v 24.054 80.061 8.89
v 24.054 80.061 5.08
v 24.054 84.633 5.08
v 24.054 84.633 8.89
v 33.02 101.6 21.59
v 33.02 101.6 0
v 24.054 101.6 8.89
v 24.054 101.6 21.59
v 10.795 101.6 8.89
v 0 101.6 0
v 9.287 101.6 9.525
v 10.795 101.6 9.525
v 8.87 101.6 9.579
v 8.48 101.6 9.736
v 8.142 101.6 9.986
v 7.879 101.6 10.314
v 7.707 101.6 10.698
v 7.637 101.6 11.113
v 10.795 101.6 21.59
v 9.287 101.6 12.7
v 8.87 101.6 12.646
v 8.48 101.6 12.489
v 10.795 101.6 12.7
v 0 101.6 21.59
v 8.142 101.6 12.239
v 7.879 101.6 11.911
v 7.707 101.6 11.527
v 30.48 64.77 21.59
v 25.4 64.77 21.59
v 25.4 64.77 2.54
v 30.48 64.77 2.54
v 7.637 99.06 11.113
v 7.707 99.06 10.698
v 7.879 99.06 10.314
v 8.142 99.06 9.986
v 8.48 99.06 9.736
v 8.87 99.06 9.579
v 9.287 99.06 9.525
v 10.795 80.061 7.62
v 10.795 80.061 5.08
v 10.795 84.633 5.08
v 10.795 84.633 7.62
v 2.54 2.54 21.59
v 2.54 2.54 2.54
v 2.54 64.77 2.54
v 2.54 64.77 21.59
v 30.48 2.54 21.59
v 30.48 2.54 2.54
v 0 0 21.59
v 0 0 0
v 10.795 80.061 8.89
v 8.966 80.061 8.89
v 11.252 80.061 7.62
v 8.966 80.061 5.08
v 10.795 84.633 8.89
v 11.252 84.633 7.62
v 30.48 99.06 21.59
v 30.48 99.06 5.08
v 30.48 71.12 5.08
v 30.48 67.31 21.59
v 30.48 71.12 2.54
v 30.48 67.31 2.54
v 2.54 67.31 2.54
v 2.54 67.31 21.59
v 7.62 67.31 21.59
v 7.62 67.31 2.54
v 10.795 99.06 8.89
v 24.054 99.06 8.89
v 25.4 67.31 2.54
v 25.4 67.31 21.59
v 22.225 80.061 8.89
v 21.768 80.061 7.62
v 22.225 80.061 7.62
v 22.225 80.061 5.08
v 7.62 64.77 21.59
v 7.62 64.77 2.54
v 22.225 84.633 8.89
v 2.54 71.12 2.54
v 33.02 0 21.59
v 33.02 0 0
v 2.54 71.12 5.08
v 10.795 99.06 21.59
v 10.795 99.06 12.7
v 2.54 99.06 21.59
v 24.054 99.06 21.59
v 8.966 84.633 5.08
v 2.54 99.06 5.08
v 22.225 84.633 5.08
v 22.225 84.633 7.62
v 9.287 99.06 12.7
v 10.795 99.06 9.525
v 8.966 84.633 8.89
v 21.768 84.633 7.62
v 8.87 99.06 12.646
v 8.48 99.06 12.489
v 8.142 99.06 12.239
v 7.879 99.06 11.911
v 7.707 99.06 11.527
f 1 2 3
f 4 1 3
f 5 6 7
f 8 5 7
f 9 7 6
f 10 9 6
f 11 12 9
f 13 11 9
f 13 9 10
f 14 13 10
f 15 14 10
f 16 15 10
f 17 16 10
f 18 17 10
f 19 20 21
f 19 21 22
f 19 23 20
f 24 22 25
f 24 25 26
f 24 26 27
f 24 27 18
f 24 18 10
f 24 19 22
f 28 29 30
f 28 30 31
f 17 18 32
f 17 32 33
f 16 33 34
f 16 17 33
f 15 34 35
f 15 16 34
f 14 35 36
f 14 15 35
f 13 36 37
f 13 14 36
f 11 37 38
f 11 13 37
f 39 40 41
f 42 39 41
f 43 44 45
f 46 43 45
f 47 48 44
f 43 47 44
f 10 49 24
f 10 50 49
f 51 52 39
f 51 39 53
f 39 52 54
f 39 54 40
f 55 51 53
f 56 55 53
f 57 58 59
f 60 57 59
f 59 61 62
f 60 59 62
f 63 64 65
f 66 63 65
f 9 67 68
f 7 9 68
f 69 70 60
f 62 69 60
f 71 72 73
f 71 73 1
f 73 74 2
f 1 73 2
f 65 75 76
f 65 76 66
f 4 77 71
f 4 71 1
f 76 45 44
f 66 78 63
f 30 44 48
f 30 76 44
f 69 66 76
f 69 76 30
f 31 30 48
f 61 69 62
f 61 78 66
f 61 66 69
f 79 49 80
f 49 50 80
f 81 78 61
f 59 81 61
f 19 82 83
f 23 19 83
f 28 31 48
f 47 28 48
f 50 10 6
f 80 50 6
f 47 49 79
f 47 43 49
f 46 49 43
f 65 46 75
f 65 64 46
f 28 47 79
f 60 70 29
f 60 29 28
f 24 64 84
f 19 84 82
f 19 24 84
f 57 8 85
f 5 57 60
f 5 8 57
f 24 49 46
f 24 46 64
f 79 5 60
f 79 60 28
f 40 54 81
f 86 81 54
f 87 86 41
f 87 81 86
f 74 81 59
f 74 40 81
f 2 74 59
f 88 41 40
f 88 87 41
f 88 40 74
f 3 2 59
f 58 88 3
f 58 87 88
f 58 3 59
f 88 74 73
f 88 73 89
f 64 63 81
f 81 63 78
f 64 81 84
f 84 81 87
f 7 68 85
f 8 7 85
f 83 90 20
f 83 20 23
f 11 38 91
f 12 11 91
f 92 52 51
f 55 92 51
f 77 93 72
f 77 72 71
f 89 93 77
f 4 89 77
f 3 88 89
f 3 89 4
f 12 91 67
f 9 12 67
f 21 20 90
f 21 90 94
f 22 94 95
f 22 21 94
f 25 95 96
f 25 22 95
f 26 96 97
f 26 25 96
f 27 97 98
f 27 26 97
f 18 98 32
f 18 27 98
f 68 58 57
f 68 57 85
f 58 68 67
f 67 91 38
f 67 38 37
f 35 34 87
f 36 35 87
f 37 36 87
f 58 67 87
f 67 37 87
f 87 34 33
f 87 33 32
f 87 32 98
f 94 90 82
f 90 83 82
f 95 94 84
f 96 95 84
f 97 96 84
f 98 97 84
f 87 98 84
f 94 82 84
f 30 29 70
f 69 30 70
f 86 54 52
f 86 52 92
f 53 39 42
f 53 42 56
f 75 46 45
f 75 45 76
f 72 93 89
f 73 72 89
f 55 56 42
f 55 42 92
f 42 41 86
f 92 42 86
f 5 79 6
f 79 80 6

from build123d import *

# Parameters (mm, degrees)
F0_W        = 33.02
F0_H        = 101.6
F1_DEPTH    = 2.54
F2_W        = 33.02
F2_H        = 101.6
F2_W_2      = 5.08
F2_H_2      = 2.54
F3_DEPTH    = 19.05
F2_W_3      = 27.94
F2_H_3      = 27.94
F2_W_4      = 1.8288
F2_H_4      = 4.572
F4_DEPTH    = 2.54
F5_DEPTH    = 5.08
F7_W        = 3.1588217151
F7_H        = 3.175
F8_DEPTH    = 25.4
F9_T1_DEPTH = 2.54
F10_W       = 0.4572
F10_H       = 4.572
F10_W_2     = 1.8288
F10_W_3     = 2.286
F11_DEPTH   = 1.27
F13_DEPTH   = 6.35


# Not quite as in the source:
# - a fillet or chamfer that OpenCascade refuses, or shapes differently, is made with other operations: its cross-section is extruded or revolved along the edge and cut away or added


with BuildPart() as f1:
    # F0 (on Top) → F1 (new body)
    with BuildSketch(Plane.XY):
        with Locations((16.51, 50.8)):
            Rectangle(F0_W, F0_H)
    extrude(amount=F1_DEPTH)

    # F2 (on face) → F3 (join)
    with BuildSketch(Plane.XY.offset(2.54)):
        with Locations((16.51, 50.8)):
            Rectangle(F2_W, F2_H)
        Polygon((30.48, 2.54), (2.54, 2.54), (2.54, 64.77), (2.54, 67.31), (2.54, 71.12), (2.54, 99.06), (30.48, 99.06), (30.48, 71.12), (30.48, 67.31), (30.48, 64.77), align=None, mode=Mode.SUBTRACT)
        with Locations((5.08, 66.04)):
            Rectangle(F2_W_2, F2_H_2)
        with Locations((27.94, 66.04)):
            Rectangle(F2_W_2, F2_H_2)
    extrude(amount=F3_DEPTH)

    # F2 (on face) → F4 (join)
    with BuildSketch(Plane.XY.offset(2.54)):
        with Locations((16.51, 85.09)):
            Rectangle(F2_W_3, F2_H_3)
        with Locations((9.8806, 82.3468)):
            Rectangle(F2_W_4, F2_H_4, mode=Mode.SUBTRACT)
        with Locations((23.1394, 82.3468)):
            Rectangle(F2_W_4, F2_H_4, mode=Mode.SUBTRACT)
    extrude(amount=F4_DEPTH)

    # F2 (on face) → F5 (join)
    with BuildSketch(Plane.XY.offset(2.54)):
        with Locations((9.8806, 82.3468)):
            Rectangle(F2_W_4, F2_H_4)
        with Locations((23.1394, 82.3468)):
            Rectangle(F2_W_4, F2_H_4)
    extrude(amount=F5_DEPTH)

    # F7 (on face) → F8 (cut)
    with BuildSketch(Plane.XZ.offset(-99.06)):
        Polygon((10.795, 9.525), (10.795, 8.89), (24.0538, 8.89), (24.0538, 21.59), (10.795, 21.59), (10.795, 12.7), align=None)
        with Locations((9.2155891424, 11.1125)):
            Rectangle(F7_W, F7_H)
    extrude(amount=-F8_DEPTH, mode=Mode.SUBTRACT)

    # F9: fillet of radius 1.651 on 2 edges, made by hand

    # F9_s2 → F9_t1 (join)
    with BuildSketch(Plane.XZ.offset(-101.6)):
        with BuildLine():
            ThreePointArc((9.2871782849, 12.7), (8.1197449891, 12.2164332957), (7.6361782849, 11.049))
            Line((7.6361782849, 11.049), (7.6361782849, 12.7))
            Line((7.6361782849, 12.7), (9.2871782849, 12.7))
        make_face()
        with BuildLine():
            ThreePointArc((7.6361782849, 11.176), (8.1197449891, 10.0085667043), (9.2871782849, 9.525))
            Line((9.2871782849, 9.525), (7.6361782849, 9.525))
            Line((7.6361782849, 9.525), (7.6361782849, 11.176))
        make_face()
    extrude(amount=F9_T1_DEPTH)

    # F10 (on face) → F11 (join)
    with BuildSketch(Plane.XY.offset(7.62)):
        with Locations((11.0236, 82.3468)):
            Rectangle(F10_W, F10_H)
        with Locations((9.8806, 82.3468)):
            Rectangle(F10_W_2, F10_H)
        with Locations((22.9108, 82.3468)):
            Rectangle(F10_W_3, F10_H)
    extrude(amount=F11_DEPTH)

    # F12 (on face) → F13 (cut)
    with BuildSketch(Plane.XZ.offset(-80.0608)):
        Polygon((10.795, 8.89), (11.2522, 7.62), (11.2522, 8.89), align=None)
        Polygon((21.7678, 7.62), (22.225, 8.89), (21.7678, 8.89), align=None)
    extrude(amount=-F13_DEPTH, mode=Mode.SUBTRACT)


solid = f1.part
